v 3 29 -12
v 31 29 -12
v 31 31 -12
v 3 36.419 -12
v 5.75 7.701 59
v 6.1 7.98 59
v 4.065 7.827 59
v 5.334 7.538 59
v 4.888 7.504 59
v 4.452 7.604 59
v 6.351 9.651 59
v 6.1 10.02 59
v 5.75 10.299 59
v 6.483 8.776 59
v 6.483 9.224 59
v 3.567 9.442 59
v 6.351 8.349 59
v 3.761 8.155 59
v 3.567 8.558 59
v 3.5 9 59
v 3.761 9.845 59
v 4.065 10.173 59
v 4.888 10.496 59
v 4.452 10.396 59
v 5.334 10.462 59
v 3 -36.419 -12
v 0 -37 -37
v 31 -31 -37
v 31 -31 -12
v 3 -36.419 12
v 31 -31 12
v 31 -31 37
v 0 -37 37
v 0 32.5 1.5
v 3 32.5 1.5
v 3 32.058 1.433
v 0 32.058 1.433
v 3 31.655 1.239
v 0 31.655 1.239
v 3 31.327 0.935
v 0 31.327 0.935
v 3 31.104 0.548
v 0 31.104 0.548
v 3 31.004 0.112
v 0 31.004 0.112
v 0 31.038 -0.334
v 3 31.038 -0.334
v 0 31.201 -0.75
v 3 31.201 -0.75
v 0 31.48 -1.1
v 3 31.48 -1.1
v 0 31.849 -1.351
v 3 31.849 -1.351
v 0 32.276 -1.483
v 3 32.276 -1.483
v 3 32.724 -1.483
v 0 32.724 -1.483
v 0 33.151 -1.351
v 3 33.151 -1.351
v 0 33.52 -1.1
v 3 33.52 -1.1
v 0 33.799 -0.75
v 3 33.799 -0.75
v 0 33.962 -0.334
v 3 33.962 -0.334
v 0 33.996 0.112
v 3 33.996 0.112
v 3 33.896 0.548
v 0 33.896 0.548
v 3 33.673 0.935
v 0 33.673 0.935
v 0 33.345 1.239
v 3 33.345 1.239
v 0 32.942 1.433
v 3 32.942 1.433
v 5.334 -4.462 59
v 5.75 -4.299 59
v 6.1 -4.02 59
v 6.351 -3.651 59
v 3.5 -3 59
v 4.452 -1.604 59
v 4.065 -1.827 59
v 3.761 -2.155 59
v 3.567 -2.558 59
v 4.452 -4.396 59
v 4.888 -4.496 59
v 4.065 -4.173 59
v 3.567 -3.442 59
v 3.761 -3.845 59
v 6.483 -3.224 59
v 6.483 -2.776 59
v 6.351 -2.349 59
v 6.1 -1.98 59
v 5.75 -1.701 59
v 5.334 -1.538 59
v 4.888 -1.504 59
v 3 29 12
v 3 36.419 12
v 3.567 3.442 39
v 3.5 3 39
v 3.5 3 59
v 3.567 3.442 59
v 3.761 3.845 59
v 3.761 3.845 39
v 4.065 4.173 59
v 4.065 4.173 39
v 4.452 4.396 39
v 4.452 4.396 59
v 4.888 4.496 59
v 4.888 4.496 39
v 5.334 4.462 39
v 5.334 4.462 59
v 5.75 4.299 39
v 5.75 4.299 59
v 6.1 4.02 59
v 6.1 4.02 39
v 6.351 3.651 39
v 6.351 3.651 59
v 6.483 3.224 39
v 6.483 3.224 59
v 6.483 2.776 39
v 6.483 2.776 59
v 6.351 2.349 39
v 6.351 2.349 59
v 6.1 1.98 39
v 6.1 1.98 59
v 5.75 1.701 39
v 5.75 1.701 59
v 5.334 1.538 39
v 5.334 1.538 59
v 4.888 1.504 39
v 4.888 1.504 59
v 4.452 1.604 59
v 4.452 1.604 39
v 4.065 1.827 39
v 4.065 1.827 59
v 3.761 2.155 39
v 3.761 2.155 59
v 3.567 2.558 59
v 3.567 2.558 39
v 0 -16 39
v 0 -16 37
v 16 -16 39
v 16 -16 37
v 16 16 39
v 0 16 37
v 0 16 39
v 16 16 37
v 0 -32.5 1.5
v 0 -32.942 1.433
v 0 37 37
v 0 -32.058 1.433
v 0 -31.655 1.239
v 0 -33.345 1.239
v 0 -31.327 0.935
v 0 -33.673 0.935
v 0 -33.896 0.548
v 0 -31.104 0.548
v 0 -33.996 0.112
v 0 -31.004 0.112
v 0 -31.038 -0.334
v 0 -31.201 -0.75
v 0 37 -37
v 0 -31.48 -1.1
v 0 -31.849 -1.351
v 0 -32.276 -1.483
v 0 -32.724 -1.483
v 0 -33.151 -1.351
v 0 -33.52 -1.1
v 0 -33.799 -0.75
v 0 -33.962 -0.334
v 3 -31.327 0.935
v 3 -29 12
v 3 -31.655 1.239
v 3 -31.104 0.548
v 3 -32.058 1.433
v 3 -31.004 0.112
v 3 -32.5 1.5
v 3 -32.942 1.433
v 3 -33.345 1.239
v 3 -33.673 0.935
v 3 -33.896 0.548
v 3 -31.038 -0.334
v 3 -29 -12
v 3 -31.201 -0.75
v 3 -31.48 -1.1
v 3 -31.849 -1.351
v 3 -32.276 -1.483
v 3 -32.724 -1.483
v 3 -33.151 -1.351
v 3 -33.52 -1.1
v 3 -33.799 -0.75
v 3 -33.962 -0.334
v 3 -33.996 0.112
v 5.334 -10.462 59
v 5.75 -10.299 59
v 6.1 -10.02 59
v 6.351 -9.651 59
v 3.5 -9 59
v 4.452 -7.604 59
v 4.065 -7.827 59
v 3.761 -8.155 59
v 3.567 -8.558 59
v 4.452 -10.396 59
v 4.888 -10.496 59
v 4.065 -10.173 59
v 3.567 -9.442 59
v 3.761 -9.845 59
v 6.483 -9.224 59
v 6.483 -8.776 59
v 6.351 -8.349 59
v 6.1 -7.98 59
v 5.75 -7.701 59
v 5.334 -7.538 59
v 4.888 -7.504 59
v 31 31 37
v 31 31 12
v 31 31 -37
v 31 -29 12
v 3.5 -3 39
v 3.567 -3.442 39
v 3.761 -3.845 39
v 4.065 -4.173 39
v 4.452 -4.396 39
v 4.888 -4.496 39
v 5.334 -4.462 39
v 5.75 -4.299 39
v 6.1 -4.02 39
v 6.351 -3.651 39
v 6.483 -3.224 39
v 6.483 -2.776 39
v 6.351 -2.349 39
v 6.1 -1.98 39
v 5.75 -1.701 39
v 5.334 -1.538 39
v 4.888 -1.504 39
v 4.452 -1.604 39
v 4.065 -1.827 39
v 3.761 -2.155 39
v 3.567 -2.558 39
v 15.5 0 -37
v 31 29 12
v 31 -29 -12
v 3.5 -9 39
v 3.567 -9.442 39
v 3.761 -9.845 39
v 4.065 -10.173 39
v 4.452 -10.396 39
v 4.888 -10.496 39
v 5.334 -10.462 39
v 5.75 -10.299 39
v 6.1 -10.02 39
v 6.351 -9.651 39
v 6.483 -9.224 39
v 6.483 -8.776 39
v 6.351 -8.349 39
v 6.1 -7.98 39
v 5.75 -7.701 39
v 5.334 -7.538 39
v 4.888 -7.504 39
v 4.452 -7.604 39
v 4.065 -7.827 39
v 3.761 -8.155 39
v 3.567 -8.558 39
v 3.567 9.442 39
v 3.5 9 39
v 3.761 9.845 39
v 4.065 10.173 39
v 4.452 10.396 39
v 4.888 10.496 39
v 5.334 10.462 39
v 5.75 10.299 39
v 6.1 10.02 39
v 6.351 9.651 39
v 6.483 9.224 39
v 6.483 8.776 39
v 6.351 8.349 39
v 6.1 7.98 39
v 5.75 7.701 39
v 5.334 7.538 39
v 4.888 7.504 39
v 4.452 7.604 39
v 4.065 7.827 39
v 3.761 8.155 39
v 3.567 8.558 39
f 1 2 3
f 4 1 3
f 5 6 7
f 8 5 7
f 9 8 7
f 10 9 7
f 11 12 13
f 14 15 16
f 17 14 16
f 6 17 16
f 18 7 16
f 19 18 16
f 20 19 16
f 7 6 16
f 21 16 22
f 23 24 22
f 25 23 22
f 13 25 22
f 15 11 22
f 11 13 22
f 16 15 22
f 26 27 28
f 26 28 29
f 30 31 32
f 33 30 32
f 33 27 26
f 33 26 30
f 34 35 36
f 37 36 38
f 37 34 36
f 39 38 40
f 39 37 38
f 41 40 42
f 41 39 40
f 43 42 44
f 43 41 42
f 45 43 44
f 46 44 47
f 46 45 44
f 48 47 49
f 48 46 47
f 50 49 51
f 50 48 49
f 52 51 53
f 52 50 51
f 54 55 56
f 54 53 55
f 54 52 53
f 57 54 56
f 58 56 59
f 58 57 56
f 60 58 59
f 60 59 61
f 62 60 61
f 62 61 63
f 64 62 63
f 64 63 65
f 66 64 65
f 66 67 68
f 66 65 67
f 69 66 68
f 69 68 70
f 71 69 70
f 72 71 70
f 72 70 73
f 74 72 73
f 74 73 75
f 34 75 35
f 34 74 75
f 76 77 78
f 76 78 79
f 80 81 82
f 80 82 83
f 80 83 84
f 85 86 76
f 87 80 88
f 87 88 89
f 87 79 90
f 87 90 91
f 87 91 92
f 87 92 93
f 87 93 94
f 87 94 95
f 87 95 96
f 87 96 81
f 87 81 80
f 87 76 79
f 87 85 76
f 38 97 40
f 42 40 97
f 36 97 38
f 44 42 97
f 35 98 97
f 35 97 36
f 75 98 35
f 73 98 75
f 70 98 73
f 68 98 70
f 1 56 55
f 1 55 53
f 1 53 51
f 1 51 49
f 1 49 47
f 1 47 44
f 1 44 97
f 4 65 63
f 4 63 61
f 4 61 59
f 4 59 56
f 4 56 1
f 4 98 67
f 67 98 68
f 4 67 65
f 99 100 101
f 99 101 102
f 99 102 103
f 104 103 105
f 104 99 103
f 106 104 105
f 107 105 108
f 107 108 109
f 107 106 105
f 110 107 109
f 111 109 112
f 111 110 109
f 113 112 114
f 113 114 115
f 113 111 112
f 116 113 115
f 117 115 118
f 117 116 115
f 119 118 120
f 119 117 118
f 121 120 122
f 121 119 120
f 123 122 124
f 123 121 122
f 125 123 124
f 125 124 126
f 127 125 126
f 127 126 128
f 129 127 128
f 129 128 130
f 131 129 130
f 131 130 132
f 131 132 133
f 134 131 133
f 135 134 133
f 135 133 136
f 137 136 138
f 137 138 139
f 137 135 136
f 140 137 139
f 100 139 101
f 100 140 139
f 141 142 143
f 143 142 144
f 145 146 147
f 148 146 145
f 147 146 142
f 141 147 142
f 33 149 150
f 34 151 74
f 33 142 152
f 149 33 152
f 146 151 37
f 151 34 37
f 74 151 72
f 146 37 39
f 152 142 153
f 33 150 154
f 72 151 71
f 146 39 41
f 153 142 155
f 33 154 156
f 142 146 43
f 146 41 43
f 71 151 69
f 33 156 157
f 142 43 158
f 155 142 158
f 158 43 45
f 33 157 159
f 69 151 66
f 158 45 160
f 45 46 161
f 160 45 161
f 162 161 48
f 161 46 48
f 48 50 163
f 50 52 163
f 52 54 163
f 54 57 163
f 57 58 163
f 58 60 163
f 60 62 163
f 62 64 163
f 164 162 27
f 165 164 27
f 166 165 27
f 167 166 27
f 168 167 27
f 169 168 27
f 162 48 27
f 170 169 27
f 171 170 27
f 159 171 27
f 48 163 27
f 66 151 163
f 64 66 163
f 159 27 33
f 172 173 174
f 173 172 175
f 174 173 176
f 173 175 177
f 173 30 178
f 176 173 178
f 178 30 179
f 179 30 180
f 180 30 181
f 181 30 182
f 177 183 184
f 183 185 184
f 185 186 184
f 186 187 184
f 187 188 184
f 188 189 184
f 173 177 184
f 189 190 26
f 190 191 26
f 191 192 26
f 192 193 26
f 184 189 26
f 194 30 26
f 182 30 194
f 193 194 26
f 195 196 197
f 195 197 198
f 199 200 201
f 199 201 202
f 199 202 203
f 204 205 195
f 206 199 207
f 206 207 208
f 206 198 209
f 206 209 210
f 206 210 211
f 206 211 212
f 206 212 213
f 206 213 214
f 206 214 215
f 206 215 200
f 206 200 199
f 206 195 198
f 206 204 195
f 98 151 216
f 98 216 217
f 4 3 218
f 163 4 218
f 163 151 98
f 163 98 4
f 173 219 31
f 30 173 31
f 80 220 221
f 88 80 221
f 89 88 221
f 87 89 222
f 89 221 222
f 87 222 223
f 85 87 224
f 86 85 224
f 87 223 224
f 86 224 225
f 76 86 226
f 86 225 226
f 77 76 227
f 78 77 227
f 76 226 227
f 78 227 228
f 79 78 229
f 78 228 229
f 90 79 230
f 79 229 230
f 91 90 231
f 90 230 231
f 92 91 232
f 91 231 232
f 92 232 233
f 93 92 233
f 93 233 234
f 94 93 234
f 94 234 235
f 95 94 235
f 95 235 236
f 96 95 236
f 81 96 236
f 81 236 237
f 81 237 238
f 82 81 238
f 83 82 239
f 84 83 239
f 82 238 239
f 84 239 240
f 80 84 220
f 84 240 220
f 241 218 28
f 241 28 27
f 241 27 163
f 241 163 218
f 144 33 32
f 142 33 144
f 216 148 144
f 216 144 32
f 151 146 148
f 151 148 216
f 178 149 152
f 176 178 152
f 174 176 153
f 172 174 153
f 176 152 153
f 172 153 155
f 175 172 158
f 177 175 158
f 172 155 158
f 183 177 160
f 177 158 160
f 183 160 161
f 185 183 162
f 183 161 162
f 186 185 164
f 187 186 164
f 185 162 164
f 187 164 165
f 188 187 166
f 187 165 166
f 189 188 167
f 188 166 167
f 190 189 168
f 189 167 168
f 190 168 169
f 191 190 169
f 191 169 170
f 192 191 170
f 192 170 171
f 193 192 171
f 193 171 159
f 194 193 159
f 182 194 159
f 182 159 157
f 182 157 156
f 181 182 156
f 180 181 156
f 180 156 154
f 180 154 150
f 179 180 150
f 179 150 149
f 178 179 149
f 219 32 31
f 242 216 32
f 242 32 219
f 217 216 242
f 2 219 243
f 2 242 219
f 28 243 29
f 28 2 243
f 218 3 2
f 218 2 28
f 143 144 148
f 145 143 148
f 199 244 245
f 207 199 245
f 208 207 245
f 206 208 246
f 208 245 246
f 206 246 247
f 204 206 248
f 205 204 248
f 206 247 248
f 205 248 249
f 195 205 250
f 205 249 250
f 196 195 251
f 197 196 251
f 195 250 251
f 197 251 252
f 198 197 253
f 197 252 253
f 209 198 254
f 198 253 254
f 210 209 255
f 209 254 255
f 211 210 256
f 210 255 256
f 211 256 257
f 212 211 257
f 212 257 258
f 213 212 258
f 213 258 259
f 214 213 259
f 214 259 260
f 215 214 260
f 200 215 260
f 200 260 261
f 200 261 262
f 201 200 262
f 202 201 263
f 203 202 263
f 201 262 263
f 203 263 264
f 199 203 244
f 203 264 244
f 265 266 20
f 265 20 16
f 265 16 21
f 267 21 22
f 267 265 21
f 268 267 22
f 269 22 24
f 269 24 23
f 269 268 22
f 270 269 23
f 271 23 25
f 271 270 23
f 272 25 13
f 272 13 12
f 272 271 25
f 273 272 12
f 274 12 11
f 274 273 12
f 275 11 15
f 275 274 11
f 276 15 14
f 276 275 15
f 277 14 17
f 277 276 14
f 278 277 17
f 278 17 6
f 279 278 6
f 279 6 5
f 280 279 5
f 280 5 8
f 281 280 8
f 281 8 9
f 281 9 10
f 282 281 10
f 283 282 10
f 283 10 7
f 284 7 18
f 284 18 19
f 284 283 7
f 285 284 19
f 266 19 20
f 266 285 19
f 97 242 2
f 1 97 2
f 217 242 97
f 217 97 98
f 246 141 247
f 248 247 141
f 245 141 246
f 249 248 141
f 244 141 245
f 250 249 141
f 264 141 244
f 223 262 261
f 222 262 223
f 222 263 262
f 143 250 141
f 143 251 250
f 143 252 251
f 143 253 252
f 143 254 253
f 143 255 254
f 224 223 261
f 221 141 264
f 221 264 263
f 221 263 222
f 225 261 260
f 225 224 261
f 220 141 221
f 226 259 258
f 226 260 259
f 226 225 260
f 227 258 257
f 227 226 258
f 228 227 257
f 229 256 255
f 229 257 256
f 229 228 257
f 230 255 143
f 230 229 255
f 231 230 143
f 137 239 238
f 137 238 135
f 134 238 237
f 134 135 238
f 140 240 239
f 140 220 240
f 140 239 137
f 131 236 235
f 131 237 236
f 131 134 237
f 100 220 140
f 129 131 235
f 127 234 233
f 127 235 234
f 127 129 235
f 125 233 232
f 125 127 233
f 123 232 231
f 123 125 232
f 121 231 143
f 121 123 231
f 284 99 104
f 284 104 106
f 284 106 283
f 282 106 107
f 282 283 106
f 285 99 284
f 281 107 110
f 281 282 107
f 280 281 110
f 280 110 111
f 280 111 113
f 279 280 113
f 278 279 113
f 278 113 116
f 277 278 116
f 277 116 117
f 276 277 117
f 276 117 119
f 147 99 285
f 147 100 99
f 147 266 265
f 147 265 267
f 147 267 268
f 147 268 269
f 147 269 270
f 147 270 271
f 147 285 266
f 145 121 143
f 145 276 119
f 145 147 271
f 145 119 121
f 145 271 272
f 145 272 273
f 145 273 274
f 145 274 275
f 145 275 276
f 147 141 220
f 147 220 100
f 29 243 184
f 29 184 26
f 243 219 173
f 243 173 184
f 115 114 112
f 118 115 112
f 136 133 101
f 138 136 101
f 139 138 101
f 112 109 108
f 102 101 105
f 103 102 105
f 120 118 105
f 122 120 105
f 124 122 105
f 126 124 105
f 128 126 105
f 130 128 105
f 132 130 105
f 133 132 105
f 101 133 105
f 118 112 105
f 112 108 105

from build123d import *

# Parameters (mm, degrees)
SKETCH_3_W          = 24
SKETCH_3_H          = 8
CUT_EXTRUDE_1_DEPTH = 28
SKETCH_4_W          = 16
SKETCH_4_H          = 32
EXTRUDE_1_DEPTH     = 2
SKETCH_5_R          = 1.5
EXTRUDE_2_DEPTH     = 20
SKETCH_6_R          = 1.5
CUT_EXTRUDE_2_DEPTH = 77.229915477


with BuildPart() as part:
    # 草图2 → 放样1 section 0
    with BuildSketch(Plane(origin=(31, 0, 0), x_dir=(0, 0, -1), z_dir=(1, 0, 0))):
        with BuildLine():
            Line((-37, 31), (37, 31))
            Line((37, 31), (37, -31))
            Line((37, -31), (-37, -31))
            Line((-37, -31), (-37, 31))
        make_face()
    # 草图1 → 放样1 section 1
    with BuildSketch(Plane(origin=(0, 0, 0), x_dir=(0, 0, -1), z_dir=(1, 0, 0))):
        with BuildLine():
            Line((-37, 37), (37, 37))
            Line((37, 37), (37, -37))
            Line((37, -37), (-37, -37))
            Line((-37, -37), (-37, 37))
        make_face()
    loft()

    # 草图3 → 切除-拉伸1 (cut)
    with BuildSketch(Plane(origin=(31, 0, 0), x_dir=(0, 0, -1), z_dir=(1, 0, 0))):
        with Locations((0, 33)):
            Rectangle(SKETCH_3_W, SKETCH_3_H)
    cut_extrude_1 = extrude(amount=-CUT_EXTRUDE_1_DEPTH, mode=Mode.SUBTRACT)

    # 镜向1: 切除-拉伸1 across plane
    add(cut_extrude_1.mirror(Plane.ZX), mode=Mode.SUBTRACT)

    # 草图4 → 凸台-拉伸1 (add)
    with BuildSketch(Plane.XY.offset(37)):
        with Locations((8, 0)):
            Rectangle(SKETCH_4_W, SKETCH_4_H)
    extrude(amount=EXTRUDE_1_DEPTH)

    # 草图5 → 凸台-拉伸2 (add)
    with BuildSketch(Plane.XY.offset(39)):
        with Locations(Location((5, -3, 0), (0, 0, 180))):
            Circle(SKETCH_5_R)
        with Locations(Location((5, -9, 0), (0, 0, 180))):
            Circle(SKETCH_5_R)
    extrude_2 = extrude(amount=EXTRUDE_2_DEPTH)

    # 镜向2: 凸台-拉伸2 across plane
    add(extrude_2.mirror(Plane.ZX))

    # 草图6 → 切除-拉伸2 (cut, through all)
    with BuildSketch(Plane.ZY):
        with Locations((0, -32.5)):
            Circle(SKETCH_6_R)
    cut_extrude_2 = extrude(amount=-CUT_EXTRUDE_2_DEPTH, mode=Mode.SUBTRACT)

    # 镜向3: 切除-拉伸2 across plane
    add(cut_extrude_2.mirror(Plane.ZX), mode=Mode.SUBTRACT)


solid = part.part
